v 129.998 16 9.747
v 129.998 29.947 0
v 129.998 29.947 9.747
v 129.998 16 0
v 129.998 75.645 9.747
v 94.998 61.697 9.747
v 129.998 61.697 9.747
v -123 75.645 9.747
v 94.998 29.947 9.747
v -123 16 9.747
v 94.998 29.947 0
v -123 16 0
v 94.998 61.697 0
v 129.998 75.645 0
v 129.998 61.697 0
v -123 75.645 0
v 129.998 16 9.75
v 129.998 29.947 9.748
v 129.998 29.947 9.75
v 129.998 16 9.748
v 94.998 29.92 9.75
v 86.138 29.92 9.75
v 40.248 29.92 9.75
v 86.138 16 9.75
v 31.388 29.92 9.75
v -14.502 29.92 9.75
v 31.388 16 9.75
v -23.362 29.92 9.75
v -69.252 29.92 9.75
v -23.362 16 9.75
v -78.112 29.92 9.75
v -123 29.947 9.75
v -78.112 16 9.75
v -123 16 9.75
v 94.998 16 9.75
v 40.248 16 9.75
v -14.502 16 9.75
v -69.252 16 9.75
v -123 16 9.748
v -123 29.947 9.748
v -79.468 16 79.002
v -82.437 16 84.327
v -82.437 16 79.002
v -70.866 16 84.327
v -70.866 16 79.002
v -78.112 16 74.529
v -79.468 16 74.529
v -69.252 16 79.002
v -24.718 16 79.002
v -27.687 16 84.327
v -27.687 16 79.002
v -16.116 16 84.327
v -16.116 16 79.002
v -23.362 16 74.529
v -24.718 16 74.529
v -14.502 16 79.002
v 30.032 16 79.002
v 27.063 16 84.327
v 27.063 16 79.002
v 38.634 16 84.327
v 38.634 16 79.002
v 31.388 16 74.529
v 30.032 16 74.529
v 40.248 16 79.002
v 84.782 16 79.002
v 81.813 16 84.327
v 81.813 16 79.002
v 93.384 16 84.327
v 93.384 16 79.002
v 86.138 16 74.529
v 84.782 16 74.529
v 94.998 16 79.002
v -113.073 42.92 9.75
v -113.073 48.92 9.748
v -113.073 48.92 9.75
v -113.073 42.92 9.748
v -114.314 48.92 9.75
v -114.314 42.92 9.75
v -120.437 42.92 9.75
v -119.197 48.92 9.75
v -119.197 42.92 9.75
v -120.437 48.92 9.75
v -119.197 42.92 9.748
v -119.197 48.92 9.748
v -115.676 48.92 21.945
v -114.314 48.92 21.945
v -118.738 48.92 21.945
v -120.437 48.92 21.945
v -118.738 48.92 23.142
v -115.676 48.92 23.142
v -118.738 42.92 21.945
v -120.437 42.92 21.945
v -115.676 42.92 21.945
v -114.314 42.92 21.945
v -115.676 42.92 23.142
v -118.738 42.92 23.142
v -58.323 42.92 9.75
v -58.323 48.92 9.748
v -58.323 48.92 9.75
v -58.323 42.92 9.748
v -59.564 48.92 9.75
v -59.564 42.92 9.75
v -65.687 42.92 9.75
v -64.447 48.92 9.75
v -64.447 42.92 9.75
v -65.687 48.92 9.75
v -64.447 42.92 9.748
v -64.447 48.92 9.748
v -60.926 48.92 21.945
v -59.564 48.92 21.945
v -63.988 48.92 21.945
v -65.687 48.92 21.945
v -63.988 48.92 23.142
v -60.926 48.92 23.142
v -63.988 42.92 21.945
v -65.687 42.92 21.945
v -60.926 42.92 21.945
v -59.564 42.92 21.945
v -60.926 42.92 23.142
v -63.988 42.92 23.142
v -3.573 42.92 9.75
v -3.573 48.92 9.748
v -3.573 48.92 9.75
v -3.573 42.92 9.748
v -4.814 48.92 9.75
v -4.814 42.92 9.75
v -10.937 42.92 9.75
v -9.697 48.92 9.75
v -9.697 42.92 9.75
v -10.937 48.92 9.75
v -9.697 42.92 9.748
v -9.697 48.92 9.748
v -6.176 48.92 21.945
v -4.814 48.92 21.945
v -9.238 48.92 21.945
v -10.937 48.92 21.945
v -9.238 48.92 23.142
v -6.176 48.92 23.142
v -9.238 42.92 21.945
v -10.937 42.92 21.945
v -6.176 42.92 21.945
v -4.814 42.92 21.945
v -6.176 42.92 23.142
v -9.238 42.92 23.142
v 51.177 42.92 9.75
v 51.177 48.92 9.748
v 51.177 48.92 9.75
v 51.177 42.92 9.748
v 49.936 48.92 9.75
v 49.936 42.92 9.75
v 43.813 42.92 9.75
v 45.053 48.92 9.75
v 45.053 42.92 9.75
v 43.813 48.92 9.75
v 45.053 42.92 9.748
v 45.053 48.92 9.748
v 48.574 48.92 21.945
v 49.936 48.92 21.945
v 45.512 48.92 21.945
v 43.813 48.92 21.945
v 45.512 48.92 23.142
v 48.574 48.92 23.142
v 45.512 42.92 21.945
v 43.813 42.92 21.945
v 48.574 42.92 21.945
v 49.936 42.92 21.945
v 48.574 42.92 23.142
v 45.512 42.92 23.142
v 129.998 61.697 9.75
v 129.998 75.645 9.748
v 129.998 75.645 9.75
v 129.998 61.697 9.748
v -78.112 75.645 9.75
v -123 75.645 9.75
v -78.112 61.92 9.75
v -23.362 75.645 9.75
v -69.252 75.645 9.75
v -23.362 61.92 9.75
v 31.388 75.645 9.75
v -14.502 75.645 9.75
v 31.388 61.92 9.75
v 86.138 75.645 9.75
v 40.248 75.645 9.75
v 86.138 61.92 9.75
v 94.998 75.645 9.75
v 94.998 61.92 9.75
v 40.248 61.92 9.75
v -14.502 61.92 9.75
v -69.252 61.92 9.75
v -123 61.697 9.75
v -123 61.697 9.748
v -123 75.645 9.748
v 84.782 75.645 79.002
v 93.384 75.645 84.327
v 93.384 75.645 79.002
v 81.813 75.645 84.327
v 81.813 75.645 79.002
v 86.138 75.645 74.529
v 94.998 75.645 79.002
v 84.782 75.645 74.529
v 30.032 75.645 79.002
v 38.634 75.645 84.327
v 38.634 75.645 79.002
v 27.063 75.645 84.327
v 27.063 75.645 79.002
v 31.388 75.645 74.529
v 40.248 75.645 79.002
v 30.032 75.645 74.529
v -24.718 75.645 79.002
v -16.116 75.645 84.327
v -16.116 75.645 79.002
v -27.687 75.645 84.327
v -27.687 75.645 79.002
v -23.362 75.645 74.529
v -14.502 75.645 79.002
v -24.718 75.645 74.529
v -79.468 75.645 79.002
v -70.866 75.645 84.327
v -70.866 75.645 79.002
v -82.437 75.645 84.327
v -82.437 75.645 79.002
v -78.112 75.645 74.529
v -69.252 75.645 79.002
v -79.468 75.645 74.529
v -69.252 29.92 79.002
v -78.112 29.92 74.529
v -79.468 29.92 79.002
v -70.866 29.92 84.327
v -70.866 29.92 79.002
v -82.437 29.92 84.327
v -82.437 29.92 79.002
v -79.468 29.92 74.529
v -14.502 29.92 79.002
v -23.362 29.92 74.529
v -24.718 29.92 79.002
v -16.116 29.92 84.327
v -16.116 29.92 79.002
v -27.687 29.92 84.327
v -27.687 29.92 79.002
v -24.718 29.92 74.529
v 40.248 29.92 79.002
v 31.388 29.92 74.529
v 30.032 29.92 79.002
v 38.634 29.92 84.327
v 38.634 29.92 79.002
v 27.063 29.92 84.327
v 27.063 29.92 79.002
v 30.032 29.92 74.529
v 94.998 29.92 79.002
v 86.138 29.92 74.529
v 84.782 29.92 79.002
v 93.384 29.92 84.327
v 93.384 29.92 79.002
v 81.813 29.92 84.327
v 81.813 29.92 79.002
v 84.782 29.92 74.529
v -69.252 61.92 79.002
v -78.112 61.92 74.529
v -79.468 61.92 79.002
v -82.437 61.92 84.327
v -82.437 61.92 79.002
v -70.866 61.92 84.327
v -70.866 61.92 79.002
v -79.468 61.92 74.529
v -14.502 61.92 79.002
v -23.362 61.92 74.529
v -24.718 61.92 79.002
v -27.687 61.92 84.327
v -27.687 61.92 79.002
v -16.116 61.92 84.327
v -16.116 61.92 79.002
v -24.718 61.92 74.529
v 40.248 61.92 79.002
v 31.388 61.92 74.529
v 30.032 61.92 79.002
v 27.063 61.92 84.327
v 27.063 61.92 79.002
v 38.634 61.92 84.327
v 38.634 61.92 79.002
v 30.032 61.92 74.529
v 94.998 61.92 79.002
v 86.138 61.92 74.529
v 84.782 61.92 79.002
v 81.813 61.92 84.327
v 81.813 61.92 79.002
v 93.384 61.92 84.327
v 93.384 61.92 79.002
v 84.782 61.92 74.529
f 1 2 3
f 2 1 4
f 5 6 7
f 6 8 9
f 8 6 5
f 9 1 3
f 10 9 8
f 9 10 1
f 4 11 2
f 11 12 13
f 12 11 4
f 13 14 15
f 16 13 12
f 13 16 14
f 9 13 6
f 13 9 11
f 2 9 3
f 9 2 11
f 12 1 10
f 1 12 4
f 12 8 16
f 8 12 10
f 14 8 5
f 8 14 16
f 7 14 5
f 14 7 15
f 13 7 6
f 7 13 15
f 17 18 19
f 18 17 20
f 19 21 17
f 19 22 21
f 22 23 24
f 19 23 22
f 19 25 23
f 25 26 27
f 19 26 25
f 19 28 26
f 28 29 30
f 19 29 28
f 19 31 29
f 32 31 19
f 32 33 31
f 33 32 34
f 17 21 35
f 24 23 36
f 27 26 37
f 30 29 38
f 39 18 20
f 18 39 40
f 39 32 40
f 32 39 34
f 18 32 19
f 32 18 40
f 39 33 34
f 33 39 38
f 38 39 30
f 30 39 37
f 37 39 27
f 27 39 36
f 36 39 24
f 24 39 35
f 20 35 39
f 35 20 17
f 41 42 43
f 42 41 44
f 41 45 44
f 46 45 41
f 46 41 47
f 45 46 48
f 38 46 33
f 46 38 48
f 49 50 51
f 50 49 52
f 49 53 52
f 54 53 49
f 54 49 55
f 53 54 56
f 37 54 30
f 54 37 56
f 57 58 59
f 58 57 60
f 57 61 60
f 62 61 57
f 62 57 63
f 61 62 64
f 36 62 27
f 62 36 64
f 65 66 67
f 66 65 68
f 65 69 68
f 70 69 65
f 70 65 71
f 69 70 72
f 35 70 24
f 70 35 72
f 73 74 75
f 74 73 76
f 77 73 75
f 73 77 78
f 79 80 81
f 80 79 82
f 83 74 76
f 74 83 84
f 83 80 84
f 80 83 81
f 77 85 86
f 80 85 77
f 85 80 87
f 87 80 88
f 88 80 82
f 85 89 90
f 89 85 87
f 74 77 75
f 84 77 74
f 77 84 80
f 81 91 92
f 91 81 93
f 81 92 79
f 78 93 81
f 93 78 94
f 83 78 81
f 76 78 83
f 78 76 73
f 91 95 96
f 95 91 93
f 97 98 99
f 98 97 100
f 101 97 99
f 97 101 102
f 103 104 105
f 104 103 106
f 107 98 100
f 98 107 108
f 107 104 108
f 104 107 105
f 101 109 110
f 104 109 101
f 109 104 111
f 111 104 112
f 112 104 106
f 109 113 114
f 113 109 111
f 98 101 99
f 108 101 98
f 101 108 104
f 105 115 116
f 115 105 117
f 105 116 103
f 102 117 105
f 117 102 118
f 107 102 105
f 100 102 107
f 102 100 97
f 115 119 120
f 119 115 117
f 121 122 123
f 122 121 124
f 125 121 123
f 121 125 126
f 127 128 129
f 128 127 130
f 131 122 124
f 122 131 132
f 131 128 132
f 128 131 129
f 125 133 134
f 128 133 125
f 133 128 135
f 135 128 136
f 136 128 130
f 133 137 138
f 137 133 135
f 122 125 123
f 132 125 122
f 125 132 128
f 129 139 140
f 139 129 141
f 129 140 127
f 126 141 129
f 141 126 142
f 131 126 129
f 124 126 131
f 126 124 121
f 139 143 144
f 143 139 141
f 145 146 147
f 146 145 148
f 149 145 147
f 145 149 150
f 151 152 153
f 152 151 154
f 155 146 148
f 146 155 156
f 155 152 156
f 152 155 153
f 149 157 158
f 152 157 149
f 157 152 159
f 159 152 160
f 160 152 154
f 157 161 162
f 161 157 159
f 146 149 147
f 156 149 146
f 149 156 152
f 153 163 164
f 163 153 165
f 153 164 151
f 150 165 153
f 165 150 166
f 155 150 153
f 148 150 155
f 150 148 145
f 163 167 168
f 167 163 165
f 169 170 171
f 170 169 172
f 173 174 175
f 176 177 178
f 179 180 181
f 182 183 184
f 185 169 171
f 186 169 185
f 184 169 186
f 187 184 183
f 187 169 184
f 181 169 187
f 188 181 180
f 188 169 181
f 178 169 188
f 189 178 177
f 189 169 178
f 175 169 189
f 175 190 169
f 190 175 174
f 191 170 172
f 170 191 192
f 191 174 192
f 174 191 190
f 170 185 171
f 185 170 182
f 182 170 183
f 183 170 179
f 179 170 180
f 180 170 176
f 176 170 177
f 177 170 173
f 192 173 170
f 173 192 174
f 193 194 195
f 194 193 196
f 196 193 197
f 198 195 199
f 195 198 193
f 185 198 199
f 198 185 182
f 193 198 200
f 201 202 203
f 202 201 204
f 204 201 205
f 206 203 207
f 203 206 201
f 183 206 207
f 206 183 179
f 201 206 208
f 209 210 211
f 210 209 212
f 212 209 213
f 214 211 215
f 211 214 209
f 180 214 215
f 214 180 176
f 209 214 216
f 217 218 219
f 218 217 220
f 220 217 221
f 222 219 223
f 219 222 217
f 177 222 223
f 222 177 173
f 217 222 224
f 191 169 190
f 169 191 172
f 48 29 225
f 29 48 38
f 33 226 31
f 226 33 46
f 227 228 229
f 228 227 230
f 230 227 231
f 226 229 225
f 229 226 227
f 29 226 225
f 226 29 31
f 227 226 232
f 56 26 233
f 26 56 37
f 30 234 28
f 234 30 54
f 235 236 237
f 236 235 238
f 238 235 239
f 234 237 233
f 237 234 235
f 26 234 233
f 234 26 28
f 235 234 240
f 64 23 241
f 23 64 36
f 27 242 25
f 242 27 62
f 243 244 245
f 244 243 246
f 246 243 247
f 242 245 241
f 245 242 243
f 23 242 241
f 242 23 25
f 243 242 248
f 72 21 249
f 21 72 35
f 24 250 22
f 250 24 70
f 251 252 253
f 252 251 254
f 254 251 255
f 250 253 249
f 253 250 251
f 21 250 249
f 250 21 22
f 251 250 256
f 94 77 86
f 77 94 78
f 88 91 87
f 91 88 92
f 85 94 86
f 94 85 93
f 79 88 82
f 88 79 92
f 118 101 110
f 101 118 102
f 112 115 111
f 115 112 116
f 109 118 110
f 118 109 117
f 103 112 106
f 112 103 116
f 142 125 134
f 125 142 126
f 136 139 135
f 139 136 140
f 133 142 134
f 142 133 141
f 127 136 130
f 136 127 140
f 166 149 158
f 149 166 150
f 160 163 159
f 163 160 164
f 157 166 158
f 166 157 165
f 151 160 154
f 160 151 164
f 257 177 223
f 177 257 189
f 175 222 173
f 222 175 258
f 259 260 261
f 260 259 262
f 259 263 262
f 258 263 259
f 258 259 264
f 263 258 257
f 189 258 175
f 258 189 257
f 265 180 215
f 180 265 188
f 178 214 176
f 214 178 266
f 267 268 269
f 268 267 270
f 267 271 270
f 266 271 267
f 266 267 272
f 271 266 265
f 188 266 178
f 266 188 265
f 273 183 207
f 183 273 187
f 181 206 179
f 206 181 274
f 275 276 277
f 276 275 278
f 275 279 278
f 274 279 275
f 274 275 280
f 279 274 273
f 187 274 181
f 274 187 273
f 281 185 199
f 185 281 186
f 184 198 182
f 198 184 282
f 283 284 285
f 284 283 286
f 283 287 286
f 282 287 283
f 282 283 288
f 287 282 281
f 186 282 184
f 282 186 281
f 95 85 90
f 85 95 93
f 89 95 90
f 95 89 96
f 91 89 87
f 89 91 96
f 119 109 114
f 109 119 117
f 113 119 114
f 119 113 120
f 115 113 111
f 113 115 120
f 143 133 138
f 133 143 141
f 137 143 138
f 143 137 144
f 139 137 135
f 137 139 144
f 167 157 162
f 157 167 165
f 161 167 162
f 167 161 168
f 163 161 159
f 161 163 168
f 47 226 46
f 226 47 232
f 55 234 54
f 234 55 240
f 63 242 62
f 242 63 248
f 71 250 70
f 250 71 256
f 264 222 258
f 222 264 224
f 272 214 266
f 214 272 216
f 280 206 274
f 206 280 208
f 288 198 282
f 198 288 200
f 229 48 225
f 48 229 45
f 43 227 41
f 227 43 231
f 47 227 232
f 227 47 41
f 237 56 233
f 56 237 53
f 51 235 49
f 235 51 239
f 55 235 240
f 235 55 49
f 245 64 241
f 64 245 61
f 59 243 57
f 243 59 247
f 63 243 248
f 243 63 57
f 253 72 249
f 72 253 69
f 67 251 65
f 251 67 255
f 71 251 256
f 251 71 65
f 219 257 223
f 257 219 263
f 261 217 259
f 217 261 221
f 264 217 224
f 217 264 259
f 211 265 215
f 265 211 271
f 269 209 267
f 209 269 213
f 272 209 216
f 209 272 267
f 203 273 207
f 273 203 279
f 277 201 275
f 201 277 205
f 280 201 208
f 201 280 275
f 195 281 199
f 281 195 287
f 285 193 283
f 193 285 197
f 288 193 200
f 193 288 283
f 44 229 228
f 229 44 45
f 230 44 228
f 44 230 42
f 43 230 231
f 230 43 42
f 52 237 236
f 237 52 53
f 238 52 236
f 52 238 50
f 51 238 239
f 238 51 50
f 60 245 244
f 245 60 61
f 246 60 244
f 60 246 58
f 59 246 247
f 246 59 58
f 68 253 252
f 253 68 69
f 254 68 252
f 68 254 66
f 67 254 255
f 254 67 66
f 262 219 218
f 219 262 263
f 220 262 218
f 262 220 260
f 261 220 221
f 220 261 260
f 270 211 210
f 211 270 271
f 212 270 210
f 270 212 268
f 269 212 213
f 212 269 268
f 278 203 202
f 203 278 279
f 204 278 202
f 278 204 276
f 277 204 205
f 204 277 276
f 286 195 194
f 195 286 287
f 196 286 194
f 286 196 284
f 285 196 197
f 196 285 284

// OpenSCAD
// Rewritten from layered polygon rebuild into rectilinear cubes
// Each slab is decomposed into axis-aligned rectangles and emitted as cubes.
// Note: This preserves orthogonal geometry; curved/diagonal features (if any) are approximated.

module rect_prism(x1,y1,x2,y2,z0,h){
  translate([x1,y1,z0]) cube([x2-x1, y2-y1, h], center=false);
}

module slab_1() {
  union() {
    rect_prism(94.997986,15.999999,129.997986,29.946999,0,9.747);
    rect_prism(-123.000008,15.999999,94.997986,75.644997,0,9.747);
    rect_prism(94.997986,61.696999,129.997986,75.644997,0,9.747);
  }
}

module slab_2() {
  union() {
    rect_prism(-123.000008,15.999999,129.997986,29.946999,9.748,0.002);
    rect_prism(-119.196615,42.919998,-113.073431,48.919998,9.748,0.002);
    rect_prism(-64.44663,42.919998,-58.323427,48.919998,9.748,0.002);
    rect_prism(-9.696628,42.919998,-3.573428,48.919998,9.748,0.002);
    rect_prism(45.053381,42.919998,51.176573,48.919998,9.748,0.002);
    rect_prism(-123.000008,61.696999,129.997986,75.644997,9.748,0.002);
  }
}

module slab_3() {
  union() {
    rect_prism(-78.112015,15.999999,-69.252014,29.919998,9.75,12.195);
    rect_prism(-23.362015,15.999999,-14.502014,29.919998,9.75,12.195);
    rect_prism(31.387985,15.999999,40.247986,29.919998,9.75,12.195);
    rect_prism(86.137985,15.999999,94.997986,29.919998,9.75,12.195);
    rect_prism(-120.43741,42.919998,-114.314075,48.919998,9.75,12.195);
    rect_prism(-65.687418,42.919998,-59.564071,48.919998,9.75,12.195);
    rect_prism(-10.937418,42.919998,-4.814072,48.919998,9.75,12.195);
    rect_prism(43.812582,42.919998,49.935932,48.919998,9.75,12.195);
    rect_prism(-78.112015,61.919998,-69.252014,75.644997,9.75,12.195);
    rect_prism(-23.362015,61.919998,-14.502014,75.644997,9.75,12.195);
    rect_prism(31.387985,61.919998,40.247986,75.644997,9.75,12.195);
    rect_prism(86.137985,61.919998,94.997986,75.644997,9.75,12.195);
  }
}

module slab_4() {
  union() {
    rect_prism(-78.112015,15.999999,-69.252014,29.919998,21.945,1.197);
    rect_prism(-23.362015,15.999999,-14.502014,29.919998,21.945,1.197);
    rect_prism(31.387985,15.999999,40.247986,29.919998,21.945,1.197);
    rect_prism(86.137985,15.999999,94.997986,29.919998,21.945,1.197);
    rect_prism(-118.738005,42.919998,-115.676272,48.919998,21.945,1.197);
    rect_prism(-63.988003,42.919998,-60.926268,48.919998,21.945,1.197);
    rect_prism(-9.238005,42.919998,-6.176269,48.919998,21.945,1.197);
    rect_prism(45.511995,42.919998,48.573739,48.919998,21.945,1.197);
    rect_prism(-78.112015,61.919998,-69.252014,75.644997,21.945,1.197);
    rect_prism(-23.362015,61.919998,-14.502014,75.644997,21.945,1.197);
    rect_prism(31.387985,61.919998,40.247986,75.644997,21.945,1.197);
    rect_prism(86.137985,61.919998,94.997986,75.644997,21.945,1.197);
  }
}

module slab_5() {
  union() {
    rect_prism(-78.112015,15.999999,-69.252014,29.919998,23.142,51.387);
    rect_prism(-23.362015,15.999999,-14.502014,29.919998,23.142,51.387);
    rect_prism(31.387985,15.999999,40.247986,29.919998,23.142,51.387);
    rect_prism(86.137985,15.999999,94.997986,29.919998,23.142,51.387);
    rect_prism(-78.112015,61.919998,-69.252014,75.644997,23.142,51.387);
    rect_prism(-23.362015,61.919998,-14.502014,75.644997,23.142,51.387);
    rect_prism(31.387985,61.919998,40.247986,75.644997,23.142,51.387);
    rect_prism(86.137985,61.919998,94.997986,75.644997,23.142,51.387);
  }
}

module slab_6() {
  union() {
    rect_prism(-79.467536,15.999999,-69.252014,29.919998,74.529,4.4726);
    rect_prism(-24.717536,15.999999,-14.502014,29.919998,74.529,4.4726);
    rect_prism(30.032464,15.999999,40.247986,29.919998,74.529,4.4726);
    rect_prism(84.782464,15.999999,94.997986,29.919998,74.529,4.4726);
    rect_prism(-79.467536,61.919998,-69.252014,75.644997,74.529,4.4726);
    rect_prism(-24.717536,61.919998,-14.502014,75.644997,74.529,4.4726);
    rect_prism(30.032464,61.919998,40.247986,75.644997,74.529,4.4726);
    rect_prism(84.782464,61.919998,94.997986,75.644997,74.529,4.4726);
  }
}

module slab_7() {
  union() {
    rect_prism(-82.437039,15.999999,-70.865755,29.919998,79.0016,5.3254);
    rect_prism(-27.687036,15.999999,-16.115755,29.919998,79.0016,5.3254);
    rect_prism(27.062964,15.999999,38.634246,29.919998,79.0016,5.3254);
    rect_prism(81.812961,15.999999,93.384242,29.919998,79.0016,5.3254);
    rect_prism(-82.437039,61.919998,-70.865755,75.644997,79.0016,5.3254);
    rect_prism(-27.687036,61.919998,-16.115755,75.644997,79.0016,5.3254);
    rect_prism(27.062964,61.919998,38.634246,75.644997,79.0016,5.3254);
    rect_prism(81.812961,61.919998,93.384242,75.644997,79.0016,5.3254);
  }
}

module top() {
  union() {
    slab_1();
    slab_2();
    slab_3();
    slab_4();
    slab_5();
    slab_6();
    slab_7();
  }
}

top();
